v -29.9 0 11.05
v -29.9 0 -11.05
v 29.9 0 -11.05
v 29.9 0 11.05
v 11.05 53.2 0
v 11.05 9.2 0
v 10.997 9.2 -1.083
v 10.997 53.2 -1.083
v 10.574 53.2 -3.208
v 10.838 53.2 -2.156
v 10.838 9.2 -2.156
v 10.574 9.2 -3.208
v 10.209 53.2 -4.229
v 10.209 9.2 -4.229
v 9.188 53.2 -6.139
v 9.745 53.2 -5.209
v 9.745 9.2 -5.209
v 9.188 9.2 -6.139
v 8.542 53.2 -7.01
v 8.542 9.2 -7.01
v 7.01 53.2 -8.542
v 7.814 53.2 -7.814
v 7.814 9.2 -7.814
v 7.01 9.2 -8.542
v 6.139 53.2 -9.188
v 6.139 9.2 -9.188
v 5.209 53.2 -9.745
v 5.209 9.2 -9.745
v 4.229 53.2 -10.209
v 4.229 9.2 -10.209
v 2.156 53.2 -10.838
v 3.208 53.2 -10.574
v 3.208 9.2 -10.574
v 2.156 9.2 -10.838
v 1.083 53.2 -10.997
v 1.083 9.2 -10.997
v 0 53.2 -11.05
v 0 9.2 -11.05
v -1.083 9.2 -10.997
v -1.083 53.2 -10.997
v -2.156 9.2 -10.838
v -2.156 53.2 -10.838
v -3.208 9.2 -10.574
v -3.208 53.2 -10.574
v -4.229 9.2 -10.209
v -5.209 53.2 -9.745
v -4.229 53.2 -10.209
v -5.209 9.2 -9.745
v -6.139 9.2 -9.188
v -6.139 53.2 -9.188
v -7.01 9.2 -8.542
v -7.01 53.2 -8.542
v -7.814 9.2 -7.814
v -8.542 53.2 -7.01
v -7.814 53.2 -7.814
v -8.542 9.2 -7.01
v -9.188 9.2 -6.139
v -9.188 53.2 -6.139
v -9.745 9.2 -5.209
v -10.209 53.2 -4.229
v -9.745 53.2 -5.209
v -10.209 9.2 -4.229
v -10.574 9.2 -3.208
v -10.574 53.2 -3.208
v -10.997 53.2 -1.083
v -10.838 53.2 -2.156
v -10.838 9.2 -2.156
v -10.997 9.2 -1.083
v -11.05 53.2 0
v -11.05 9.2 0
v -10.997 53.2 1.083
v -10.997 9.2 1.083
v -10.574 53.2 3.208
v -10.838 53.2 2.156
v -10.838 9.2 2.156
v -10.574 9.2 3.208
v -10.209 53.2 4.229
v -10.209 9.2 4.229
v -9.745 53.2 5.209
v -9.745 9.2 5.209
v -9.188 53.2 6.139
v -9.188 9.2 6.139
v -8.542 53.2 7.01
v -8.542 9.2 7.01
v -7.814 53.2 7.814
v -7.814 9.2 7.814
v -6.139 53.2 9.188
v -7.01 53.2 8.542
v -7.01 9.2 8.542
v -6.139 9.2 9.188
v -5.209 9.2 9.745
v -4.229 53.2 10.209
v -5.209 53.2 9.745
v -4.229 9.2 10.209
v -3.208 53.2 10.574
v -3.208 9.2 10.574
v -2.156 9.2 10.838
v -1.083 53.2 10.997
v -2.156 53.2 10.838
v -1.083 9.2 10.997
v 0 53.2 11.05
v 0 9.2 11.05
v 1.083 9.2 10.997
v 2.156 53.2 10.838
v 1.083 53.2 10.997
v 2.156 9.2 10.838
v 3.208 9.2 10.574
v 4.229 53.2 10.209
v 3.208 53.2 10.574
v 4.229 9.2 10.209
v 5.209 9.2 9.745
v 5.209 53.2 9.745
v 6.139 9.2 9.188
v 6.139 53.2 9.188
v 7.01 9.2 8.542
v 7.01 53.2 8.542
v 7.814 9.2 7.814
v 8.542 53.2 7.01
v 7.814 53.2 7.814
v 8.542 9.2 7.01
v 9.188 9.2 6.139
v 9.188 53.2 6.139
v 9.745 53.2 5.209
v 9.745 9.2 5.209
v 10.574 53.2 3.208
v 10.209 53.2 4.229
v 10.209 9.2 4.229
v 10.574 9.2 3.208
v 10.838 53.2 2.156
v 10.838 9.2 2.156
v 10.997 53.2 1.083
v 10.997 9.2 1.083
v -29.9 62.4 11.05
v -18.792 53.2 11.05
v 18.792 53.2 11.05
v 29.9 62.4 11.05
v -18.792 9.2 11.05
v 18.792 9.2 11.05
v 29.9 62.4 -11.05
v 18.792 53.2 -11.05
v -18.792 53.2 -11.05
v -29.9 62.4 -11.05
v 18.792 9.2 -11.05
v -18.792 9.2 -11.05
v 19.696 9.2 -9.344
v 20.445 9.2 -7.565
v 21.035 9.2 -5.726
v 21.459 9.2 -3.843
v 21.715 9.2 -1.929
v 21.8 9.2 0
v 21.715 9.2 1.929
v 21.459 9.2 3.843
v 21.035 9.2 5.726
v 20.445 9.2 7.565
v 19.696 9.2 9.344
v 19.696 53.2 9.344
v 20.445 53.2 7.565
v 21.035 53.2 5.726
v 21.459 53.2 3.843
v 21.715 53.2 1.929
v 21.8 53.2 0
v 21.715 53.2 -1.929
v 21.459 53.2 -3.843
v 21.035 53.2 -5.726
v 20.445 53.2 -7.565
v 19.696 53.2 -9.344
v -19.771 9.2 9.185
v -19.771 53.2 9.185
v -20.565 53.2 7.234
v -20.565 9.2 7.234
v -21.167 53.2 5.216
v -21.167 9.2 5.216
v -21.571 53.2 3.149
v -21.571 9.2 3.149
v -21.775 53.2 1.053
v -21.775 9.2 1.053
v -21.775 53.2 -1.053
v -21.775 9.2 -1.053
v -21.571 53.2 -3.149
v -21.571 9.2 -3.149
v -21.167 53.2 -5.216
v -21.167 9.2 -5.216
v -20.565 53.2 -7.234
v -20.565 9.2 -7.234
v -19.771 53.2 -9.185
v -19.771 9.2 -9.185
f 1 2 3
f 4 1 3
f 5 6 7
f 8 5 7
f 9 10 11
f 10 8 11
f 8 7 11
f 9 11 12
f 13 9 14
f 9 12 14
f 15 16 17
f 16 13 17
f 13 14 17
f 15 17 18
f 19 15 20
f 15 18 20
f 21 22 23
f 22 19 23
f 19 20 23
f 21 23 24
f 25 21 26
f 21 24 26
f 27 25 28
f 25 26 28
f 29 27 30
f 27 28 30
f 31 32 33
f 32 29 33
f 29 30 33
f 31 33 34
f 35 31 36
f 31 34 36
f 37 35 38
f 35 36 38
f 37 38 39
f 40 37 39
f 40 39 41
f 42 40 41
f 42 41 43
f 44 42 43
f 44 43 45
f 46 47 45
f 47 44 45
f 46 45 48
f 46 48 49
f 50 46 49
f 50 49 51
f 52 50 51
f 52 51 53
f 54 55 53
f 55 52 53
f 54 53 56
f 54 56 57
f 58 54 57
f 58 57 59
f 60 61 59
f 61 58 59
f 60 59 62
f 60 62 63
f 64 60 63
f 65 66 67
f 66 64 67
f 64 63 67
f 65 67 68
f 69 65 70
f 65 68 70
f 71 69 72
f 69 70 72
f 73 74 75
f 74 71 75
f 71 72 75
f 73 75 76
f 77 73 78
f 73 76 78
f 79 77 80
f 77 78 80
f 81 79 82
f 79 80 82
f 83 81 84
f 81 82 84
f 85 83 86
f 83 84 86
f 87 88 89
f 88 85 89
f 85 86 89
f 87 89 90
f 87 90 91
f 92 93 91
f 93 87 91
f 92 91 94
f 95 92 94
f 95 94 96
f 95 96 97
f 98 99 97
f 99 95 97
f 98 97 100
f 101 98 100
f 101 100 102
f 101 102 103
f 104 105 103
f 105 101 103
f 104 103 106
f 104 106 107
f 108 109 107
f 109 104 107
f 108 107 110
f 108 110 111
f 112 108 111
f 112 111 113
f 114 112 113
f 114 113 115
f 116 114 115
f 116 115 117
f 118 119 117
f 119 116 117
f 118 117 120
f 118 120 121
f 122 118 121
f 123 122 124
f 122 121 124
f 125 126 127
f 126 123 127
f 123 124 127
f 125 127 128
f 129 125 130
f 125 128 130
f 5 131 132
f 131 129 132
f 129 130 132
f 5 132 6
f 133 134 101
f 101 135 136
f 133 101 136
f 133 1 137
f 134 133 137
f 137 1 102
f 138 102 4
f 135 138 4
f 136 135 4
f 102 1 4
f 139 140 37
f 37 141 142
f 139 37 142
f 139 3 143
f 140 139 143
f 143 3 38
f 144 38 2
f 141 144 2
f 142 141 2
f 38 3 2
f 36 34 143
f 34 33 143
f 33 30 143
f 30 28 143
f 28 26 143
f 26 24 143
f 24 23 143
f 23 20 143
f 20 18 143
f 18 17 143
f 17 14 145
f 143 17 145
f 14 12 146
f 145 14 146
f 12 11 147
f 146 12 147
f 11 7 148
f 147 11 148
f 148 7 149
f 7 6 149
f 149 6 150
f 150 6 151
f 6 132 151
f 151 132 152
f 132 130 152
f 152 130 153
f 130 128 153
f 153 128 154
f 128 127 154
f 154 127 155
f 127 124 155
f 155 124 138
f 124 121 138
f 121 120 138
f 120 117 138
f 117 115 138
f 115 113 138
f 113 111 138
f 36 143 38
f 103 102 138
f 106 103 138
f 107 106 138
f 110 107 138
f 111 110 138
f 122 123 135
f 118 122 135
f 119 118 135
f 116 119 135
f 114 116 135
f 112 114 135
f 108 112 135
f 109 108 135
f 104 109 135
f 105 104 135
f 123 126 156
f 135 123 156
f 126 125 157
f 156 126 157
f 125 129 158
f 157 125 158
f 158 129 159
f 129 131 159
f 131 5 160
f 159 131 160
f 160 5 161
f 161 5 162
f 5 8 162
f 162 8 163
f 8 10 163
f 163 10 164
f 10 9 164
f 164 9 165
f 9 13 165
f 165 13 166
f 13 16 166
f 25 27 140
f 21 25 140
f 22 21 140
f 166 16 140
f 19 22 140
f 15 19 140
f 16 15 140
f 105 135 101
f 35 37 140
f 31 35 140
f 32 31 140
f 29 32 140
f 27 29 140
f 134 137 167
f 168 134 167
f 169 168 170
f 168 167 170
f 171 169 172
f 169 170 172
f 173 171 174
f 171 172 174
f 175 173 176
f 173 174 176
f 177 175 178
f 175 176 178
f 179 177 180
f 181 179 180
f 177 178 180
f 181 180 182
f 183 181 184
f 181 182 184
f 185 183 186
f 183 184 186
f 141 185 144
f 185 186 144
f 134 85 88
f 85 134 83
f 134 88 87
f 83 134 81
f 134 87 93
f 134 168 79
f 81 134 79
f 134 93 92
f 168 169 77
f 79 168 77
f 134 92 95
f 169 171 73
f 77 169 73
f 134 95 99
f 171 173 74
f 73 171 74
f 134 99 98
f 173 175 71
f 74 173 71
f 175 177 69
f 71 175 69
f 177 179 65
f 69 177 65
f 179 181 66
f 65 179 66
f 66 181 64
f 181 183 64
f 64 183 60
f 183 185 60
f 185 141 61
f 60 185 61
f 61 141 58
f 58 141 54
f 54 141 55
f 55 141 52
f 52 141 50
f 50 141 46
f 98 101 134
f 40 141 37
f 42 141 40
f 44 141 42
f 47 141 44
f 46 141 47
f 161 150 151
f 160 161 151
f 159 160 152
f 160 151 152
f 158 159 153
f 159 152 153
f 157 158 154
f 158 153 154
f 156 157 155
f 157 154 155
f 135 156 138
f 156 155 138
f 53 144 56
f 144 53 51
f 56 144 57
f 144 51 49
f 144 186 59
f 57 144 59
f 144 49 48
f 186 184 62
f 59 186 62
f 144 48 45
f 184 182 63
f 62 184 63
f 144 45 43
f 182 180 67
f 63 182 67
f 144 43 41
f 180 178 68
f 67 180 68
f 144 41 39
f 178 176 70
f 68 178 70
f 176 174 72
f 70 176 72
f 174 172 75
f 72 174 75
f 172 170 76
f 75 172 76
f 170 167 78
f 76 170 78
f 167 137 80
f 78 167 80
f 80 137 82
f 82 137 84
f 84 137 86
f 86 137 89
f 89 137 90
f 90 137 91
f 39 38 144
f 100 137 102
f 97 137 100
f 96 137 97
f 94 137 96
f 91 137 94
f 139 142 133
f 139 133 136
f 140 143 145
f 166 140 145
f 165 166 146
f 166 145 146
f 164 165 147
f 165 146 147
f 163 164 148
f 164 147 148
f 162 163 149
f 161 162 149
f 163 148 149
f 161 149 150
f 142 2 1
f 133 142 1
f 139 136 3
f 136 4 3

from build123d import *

# Parameters (mm, degrees)
BOSS_EXTRUDE1_DEPTH   = 62.4
SKETCH1_R             = 11.05
BOSS_EXTRUDE1_2_DEPTH = 62.4
BOSS_EXTRUDE1_3_DEPTH = 62.4
SKETCH2_W             = 59.8
SKETCH2_H             = 22.1
BOSS_EXTRUDE2_DEPTH   = 9.2
SKETCH3_W             = 59.8
SKETCH3_H             = 22.1
BOSS_EXTRUDE3_DEPTH   = 9.2


with BuildPart() as part:
    # Sketch1 → Boss-Extrude1 (new body)
    with BuildSketch(Plane(origin=(0, 0, 0), x_dir=(1, 0, 0), z_dir=(0, 1, 0))):
        with BuildLine():
            Line((-18.791953065, 11.05), (-29.9, 11.05))
            Line((-29.9, 11.05), (-29.9, -11.05))
            Line((-29.9, -11.05), (-18.791953065, -11.05))
            ThreePointArc((-18.791953065, -11.05), (-21.8, 0), (-18.791953065, 11.05))
        make_face()
    extrude(amount=BOSS_EXTRUDE1_DEPTH)



with BuildPart() as body_2:
    # Sketch1 → Boss-Extrude1 2 (new body)
    with BuildSketch(Plane(origin=(0, 0, 0), x_dir=(1, 0, 0), z_dir=(0, 1, 0))):
        Circle(SKETCH1_R)
    extrude(amount=BOSS_EXTRUDE1_2_DEPTH)


with BuildPart() as body_3:
    # Sketch1 → Boss-Extrude1 3 (new body)
    with BuildSketch(Plane(origin=(0, 0, 0), x_dir=(1, 0, 0), z_dir=(0, 1, 0))):
        with BuildLine():
            Line((29.9, 11.05), (18.791953065, 11.05))
            ThreePointArc((18.791953065, 11.05), (21.034549874, 5.7260555), (21.8, 0))
            ThreePointArc((21.8, 0), (21.034549874, -5.7260555), (18.791953065, -11.05))
            Line((18.791953065, -11.05), (29.9, -11.05))
            Line((29.9, -11.05), (29.9, 11.05))
        make_face()
    extrude(amount=BOSS_EXTRUDE1_3_DEPTH)


with BuildPart() as part_1:
    add(part.part)

    add(body_2.part)  # Boss-Extrude2 merges body 2

    add(body_3.part)  # Boss-Extrude2 merges body 3
    # Sketch2 → Boss-Extrude2 (add)
    with BuildSketch(Plane(origin=(0, 62.4, 0), x_dir=(1, 0, 0), z_dir=(0, 1, 0))):
        Rectangle(SKETCH2_W, SKETCH2_H)
    extrude(amount=-BOSS_EXTRUDE2_DEPTH)

    # Sketch3 → Boss-Extrude3 (add)
    with BuildSketch(Plane.XZ):
        Rectangle(SKETCH3_W, SKETCH3_H)
    extrude(amount=-BOSS_EXTRUDE3_DEPTH)


solid = part_1.part
